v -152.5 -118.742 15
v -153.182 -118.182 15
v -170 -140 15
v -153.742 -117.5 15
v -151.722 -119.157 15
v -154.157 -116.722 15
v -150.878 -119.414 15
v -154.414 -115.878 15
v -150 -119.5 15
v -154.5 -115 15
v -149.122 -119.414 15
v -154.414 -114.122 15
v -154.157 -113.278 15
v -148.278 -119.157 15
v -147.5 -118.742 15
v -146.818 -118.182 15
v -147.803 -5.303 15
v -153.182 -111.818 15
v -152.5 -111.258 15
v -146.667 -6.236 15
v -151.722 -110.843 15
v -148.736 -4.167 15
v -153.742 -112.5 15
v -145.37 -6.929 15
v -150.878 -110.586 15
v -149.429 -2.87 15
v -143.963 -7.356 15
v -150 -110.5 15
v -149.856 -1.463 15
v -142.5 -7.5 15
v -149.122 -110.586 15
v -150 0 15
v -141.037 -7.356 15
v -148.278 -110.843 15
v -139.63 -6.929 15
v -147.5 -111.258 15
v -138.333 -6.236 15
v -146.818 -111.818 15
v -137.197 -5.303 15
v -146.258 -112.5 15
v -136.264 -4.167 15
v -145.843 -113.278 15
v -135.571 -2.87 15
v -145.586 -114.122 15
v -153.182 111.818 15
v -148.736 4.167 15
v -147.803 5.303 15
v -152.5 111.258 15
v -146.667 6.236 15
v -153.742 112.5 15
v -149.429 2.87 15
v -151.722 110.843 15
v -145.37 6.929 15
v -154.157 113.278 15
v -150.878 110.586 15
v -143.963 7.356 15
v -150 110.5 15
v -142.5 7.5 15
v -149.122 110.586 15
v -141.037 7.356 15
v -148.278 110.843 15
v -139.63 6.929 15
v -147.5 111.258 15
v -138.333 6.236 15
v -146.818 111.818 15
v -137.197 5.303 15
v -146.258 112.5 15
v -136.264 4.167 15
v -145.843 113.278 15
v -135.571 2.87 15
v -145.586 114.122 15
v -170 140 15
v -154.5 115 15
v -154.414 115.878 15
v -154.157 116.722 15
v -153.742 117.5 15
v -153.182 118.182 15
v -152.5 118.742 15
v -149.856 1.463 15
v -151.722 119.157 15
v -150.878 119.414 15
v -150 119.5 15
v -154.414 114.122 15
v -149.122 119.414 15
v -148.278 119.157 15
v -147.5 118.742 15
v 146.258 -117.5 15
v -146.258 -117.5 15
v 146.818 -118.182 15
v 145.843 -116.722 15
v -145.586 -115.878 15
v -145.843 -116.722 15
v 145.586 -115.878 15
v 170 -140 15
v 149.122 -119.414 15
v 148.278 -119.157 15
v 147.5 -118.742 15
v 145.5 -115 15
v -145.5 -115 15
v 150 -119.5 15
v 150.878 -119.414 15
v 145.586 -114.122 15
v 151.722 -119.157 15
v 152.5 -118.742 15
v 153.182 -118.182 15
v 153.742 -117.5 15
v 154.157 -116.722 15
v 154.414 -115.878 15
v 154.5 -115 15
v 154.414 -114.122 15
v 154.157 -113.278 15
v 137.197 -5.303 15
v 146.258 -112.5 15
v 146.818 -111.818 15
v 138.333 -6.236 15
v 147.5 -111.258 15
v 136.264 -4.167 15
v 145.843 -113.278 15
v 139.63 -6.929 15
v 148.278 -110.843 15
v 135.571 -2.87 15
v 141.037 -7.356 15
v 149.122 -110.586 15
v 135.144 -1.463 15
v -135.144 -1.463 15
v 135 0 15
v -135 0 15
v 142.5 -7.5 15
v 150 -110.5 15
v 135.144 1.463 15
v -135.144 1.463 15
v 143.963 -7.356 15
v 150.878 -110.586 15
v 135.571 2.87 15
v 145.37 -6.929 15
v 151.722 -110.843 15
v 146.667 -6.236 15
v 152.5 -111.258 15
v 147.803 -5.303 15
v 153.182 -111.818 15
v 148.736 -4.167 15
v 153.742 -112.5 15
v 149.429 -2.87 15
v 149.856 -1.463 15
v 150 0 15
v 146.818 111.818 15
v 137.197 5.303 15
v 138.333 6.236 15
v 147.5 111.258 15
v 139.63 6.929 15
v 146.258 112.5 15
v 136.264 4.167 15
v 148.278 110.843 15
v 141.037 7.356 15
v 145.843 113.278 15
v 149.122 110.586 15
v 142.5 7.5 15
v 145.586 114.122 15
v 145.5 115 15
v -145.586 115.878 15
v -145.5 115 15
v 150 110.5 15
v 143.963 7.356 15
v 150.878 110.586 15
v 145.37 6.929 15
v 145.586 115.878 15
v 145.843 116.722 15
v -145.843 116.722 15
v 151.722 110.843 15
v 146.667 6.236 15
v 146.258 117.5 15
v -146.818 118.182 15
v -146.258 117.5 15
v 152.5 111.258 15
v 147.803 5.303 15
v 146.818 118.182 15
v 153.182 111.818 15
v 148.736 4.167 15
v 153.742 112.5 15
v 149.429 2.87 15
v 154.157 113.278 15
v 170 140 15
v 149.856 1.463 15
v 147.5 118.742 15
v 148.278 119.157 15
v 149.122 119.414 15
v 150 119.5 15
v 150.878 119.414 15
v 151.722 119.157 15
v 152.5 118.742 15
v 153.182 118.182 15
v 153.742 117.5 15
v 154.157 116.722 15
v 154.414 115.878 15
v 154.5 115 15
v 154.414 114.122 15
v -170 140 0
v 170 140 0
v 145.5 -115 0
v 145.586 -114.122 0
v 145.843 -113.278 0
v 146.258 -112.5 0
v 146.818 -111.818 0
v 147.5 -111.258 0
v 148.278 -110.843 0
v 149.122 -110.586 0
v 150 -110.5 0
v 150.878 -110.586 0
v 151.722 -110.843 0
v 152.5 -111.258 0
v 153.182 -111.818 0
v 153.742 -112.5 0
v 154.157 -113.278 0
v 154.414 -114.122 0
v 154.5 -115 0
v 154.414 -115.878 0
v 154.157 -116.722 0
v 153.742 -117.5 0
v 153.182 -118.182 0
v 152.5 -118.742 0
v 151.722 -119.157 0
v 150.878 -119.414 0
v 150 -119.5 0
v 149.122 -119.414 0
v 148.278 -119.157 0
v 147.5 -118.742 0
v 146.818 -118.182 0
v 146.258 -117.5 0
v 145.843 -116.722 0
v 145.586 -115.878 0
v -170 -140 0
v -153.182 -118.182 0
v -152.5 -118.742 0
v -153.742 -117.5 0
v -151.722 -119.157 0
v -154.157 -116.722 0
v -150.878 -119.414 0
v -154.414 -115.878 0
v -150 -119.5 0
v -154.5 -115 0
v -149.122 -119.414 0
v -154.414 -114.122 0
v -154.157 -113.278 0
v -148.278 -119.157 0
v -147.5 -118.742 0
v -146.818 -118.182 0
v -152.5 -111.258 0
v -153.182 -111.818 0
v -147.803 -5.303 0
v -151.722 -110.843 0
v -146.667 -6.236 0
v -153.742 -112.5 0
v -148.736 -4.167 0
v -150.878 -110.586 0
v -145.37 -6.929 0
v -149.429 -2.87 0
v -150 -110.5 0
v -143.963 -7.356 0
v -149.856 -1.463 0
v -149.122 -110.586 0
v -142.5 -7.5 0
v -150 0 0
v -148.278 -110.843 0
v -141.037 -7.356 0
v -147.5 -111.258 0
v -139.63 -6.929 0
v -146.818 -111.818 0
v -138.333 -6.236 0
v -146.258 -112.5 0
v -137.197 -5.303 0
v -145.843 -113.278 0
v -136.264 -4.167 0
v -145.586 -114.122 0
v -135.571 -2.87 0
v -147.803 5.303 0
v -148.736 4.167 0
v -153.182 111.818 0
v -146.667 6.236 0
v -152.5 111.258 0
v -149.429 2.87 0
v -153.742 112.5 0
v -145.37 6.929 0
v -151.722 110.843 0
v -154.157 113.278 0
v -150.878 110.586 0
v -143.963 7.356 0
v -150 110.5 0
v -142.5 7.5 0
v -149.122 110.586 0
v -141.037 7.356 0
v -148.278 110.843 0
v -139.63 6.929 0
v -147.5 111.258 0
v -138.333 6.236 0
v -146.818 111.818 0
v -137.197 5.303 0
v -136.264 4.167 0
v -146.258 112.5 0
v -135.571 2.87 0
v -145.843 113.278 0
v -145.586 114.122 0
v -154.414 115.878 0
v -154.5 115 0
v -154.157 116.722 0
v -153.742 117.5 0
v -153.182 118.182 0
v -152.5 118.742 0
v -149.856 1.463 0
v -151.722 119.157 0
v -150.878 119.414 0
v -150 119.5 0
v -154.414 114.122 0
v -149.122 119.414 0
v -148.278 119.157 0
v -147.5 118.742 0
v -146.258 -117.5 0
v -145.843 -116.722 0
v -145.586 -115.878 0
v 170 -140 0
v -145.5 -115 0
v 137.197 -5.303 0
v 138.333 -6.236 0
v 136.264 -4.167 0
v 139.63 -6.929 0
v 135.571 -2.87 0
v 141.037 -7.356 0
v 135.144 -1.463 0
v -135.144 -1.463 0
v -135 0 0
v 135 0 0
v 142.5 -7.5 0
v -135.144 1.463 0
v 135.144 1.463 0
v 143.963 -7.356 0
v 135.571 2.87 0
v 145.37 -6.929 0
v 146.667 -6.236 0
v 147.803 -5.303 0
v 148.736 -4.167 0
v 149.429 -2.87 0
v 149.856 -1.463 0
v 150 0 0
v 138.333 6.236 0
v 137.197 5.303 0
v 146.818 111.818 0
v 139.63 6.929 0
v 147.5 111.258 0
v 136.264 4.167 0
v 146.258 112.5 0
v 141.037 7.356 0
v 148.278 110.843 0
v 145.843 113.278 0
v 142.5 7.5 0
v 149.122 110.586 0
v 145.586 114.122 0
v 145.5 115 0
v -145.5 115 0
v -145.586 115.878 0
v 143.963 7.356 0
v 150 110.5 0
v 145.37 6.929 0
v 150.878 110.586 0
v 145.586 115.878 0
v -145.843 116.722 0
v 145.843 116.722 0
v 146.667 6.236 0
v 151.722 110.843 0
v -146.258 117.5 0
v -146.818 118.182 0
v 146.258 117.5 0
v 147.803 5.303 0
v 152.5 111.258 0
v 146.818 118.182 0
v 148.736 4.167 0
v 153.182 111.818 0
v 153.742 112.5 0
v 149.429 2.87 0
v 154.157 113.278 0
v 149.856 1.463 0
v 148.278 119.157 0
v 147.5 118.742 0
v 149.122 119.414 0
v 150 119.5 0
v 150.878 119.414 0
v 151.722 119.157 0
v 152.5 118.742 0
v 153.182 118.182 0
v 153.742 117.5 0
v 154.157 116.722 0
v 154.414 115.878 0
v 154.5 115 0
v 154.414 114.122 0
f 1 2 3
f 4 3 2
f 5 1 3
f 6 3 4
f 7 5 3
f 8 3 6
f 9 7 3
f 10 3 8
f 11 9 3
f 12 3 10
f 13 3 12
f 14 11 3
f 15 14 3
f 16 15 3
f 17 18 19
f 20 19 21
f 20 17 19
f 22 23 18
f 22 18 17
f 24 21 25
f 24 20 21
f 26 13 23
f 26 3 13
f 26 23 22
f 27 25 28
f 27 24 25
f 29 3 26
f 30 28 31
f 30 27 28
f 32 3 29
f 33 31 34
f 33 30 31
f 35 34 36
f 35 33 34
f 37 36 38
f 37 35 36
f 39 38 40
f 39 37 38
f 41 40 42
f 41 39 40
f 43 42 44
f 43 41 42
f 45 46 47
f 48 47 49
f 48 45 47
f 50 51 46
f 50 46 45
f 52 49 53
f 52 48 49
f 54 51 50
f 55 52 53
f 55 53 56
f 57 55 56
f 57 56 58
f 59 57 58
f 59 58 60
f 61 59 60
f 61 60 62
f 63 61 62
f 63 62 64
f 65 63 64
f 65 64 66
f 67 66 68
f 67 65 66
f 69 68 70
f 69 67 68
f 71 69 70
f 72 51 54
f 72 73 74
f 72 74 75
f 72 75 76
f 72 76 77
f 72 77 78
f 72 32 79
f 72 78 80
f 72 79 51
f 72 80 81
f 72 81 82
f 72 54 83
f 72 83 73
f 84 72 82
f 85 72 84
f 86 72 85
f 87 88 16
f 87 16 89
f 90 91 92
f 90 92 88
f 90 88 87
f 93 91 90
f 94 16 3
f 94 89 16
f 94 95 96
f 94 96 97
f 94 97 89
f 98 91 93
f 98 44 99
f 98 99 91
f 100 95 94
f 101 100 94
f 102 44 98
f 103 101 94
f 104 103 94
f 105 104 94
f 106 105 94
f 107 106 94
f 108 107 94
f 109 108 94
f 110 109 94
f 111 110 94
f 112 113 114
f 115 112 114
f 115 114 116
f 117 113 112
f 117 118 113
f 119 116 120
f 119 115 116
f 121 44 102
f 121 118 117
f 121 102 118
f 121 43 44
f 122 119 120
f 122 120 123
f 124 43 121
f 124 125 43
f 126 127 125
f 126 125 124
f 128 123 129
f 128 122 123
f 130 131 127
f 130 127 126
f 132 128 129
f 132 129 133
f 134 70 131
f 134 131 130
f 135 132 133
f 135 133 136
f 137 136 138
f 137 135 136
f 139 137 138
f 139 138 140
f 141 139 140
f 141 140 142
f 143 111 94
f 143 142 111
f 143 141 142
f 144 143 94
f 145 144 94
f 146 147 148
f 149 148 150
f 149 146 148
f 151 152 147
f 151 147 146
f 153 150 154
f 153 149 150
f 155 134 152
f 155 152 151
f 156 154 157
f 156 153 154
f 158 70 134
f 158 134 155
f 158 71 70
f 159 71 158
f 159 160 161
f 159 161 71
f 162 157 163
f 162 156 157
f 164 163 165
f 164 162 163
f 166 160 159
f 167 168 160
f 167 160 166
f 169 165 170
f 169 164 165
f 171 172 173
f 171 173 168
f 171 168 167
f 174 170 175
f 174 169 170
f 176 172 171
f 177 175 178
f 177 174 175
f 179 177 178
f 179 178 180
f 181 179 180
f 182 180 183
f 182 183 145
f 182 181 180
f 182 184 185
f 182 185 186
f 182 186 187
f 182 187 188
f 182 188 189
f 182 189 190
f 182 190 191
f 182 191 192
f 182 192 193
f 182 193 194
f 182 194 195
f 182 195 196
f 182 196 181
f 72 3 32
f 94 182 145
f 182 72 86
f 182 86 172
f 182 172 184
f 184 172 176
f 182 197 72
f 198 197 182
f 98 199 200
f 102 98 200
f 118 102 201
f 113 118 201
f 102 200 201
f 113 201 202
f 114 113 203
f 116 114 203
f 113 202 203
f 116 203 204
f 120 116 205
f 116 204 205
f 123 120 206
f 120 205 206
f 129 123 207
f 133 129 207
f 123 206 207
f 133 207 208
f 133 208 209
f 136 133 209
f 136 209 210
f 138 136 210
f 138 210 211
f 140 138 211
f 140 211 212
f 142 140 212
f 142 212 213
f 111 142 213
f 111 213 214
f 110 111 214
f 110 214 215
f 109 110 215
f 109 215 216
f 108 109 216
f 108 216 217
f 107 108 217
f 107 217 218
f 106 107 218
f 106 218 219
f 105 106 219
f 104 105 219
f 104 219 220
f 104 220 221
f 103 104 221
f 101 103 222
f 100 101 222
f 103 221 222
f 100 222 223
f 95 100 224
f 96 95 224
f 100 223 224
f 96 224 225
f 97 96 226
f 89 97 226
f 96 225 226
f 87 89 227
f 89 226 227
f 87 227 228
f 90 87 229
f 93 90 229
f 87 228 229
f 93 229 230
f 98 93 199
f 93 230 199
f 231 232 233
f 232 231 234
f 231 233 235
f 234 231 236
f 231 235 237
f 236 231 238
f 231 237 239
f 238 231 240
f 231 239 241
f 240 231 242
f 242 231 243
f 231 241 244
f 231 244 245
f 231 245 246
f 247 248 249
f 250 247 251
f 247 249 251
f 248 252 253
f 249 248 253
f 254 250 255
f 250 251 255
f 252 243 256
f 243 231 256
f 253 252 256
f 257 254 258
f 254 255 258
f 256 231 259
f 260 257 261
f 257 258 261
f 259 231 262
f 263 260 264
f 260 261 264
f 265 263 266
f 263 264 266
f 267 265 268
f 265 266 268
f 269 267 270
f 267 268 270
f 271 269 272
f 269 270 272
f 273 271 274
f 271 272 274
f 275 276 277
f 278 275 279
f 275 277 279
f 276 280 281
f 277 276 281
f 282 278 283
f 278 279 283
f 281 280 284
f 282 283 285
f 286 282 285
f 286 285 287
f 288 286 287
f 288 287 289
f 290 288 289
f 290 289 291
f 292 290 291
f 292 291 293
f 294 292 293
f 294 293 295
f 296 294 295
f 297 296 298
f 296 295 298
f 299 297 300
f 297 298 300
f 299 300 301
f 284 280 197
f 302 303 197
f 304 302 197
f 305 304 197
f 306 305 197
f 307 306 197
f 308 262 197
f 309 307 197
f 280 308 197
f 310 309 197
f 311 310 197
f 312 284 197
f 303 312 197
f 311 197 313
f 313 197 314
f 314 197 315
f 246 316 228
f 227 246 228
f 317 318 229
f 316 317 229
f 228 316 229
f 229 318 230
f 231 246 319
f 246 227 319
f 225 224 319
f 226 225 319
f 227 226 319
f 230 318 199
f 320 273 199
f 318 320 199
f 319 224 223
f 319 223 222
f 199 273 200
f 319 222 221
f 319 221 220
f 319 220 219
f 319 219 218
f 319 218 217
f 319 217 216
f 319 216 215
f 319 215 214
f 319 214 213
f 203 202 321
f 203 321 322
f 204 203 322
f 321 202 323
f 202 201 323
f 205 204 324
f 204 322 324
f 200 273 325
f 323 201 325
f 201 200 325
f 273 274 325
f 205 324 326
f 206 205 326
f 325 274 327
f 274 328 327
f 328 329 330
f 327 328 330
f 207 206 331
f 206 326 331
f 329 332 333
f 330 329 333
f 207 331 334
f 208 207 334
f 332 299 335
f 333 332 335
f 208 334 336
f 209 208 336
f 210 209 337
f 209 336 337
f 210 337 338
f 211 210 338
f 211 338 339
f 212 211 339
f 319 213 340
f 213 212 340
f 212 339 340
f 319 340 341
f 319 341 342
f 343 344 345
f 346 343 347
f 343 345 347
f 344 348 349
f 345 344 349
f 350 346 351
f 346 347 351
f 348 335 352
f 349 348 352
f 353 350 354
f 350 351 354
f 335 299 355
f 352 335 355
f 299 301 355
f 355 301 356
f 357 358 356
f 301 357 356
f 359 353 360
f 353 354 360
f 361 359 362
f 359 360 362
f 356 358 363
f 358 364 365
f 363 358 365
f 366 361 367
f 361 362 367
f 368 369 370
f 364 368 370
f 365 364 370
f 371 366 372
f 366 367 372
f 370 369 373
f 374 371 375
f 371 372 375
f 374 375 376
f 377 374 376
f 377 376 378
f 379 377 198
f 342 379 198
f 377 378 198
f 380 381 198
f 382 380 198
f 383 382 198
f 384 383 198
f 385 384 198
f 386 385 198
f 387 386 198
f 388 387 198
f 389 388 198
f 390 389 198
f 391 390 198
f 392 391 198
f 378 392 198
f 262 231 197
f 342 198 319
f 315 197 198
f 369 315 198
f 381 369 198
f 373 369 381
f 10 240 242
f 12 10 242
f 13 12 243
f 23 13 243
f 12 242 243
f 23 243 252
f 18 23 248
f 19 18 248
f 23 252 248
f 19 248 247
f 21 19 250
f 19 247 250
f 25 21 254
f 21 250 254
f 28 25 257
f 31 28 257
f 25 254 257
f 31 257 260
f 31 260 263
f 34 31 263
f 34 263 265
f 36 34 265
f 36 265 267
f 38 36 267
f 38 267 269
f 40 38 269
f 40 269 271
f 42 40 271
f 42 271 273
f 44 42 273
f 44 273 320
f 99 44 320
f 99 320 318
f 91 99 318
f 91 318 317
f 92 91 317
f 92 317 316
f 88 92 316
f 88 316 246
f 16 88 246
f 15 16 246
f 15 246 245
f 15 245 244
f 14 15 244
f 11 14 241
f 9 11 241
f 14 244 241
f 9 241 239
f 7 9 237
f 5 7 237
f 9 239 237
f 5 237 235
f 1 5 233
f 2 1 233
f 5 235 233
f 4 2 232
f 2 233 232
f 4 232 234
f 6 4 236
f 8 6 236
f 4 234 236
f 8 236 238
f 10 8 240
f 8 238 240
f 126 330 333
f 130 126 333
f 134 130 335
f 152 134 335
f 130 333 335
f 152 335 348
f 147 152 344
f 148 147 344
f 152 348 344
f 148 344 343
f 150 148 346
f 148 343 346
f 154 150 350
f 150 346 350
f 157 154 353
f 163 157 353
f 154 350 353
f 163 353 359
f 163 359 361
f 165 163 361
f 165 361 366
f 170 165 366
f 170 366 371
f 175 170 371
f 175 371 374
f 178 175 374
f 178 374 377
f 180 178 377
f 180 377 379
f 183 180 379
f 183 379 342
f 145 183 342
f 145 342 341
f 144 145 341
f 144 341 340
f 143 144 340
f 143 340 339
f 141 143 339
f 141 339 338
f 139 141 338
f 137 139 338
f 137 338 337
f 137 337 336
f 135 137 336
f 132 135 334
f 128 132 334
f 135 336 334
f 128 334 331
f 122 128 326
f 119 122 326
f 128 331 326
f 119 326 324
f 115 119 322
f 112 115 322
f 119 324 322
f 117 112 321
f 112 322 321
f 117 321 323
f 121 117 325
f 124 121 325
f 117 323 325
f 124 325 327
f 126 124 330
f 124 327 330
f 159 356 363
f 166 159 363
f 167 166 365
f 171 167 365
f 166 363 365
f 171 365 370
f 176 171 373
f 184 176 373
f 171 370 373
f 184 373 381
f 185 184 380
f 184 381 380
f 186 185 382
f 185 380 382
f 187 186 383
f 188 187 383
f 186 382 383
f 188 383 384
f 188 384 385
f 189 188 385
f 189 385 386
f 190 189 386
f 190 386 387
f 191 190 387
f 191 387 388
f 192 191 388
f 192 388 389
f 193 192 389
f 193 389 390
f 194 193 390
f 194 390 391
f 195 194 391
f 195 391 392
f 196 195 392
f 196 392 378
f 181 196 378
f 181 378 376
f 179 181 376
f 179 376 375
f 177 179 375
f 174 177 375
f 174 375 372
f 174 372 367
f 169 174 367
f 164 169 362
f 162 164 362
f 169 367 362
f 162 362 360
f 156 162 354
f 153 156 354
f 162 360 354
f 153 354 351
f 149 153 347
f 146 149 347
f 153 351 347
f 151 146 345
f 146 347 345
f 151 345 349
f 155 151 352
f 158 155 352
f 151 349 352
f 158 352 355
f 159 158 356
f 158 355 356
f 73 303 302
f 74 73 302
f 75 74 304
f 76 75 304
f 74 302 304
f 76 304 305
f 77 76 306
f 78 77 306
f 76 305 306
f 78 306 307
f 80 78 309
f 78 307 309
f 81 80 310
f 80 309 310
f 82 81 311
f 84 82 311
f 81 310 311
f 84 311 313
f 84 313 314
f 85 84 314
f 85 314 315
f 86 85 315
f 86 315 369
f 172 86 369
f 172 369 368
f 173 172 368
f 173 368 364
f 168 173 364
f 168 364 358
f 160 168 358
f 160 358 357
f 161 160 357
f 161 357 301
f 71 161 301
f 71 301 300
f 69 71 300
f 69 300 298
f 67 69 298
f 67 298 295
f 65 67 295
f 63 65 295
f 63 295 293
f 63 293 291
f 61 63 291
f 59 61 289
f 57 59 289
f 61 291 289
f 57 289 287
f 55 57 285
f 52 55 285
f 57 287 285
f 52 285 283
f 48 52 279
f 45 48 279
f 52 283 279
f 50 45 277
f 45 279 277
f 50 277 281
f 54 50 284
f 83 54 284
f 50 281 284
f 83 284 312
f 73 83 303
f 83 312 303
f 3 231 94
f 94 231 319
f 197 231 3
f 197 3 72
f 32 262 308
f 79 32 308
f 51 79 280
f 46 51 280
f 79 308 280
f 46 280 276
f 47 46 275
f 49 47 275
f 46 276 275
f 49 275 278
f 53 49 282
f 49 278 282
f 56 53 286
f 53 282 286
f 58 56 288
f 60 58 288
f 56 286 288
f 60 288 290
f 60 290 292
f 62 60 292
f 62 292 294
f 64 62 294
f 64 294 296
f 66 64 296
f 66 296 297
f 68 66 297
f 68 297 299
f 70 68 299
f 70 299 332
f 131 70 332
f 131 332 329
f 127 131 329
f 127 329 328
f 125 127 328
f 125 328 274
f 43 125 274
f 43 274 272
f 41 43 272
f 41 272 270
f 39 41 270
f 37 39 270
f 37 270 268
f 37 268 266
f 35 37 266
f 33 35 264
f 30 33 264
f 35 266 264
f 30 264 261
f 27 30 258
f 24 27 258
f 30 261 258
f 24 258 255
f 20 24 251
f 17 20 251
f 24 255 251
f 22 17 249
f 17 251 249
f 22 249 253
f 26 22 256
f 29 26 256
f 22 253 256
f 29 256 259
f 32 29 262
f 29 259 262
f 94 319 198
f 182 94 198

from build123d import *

# Parameters (mm, degrees)
F0_W     = 340
F0_H     = 280
F1_DEPTH = 15
F3_D     = 9
F4_D     = 15


with BuildPart() as f1:
    # F0 (on Top) → F1 (new body)
    with BuildSketch(Plane.XY):
        Rectangle(F0_W, F0_H)
    extrude(amount=F1_DEPTH)

    # F3 (through all)
    with Locations(Plane.XY.offset(15)):
        with Locations((-150, 115), (-150, -115), (150, -115), (150, 115)):
            Hole(F3_D / 2)

    # F4 (through all)
    with Locations(Plane.XY.offset(15)):
        with Locations((142.5, 0), (-142.5, 0)):
            Hole(F4_D / 2)


solid = f1.part
